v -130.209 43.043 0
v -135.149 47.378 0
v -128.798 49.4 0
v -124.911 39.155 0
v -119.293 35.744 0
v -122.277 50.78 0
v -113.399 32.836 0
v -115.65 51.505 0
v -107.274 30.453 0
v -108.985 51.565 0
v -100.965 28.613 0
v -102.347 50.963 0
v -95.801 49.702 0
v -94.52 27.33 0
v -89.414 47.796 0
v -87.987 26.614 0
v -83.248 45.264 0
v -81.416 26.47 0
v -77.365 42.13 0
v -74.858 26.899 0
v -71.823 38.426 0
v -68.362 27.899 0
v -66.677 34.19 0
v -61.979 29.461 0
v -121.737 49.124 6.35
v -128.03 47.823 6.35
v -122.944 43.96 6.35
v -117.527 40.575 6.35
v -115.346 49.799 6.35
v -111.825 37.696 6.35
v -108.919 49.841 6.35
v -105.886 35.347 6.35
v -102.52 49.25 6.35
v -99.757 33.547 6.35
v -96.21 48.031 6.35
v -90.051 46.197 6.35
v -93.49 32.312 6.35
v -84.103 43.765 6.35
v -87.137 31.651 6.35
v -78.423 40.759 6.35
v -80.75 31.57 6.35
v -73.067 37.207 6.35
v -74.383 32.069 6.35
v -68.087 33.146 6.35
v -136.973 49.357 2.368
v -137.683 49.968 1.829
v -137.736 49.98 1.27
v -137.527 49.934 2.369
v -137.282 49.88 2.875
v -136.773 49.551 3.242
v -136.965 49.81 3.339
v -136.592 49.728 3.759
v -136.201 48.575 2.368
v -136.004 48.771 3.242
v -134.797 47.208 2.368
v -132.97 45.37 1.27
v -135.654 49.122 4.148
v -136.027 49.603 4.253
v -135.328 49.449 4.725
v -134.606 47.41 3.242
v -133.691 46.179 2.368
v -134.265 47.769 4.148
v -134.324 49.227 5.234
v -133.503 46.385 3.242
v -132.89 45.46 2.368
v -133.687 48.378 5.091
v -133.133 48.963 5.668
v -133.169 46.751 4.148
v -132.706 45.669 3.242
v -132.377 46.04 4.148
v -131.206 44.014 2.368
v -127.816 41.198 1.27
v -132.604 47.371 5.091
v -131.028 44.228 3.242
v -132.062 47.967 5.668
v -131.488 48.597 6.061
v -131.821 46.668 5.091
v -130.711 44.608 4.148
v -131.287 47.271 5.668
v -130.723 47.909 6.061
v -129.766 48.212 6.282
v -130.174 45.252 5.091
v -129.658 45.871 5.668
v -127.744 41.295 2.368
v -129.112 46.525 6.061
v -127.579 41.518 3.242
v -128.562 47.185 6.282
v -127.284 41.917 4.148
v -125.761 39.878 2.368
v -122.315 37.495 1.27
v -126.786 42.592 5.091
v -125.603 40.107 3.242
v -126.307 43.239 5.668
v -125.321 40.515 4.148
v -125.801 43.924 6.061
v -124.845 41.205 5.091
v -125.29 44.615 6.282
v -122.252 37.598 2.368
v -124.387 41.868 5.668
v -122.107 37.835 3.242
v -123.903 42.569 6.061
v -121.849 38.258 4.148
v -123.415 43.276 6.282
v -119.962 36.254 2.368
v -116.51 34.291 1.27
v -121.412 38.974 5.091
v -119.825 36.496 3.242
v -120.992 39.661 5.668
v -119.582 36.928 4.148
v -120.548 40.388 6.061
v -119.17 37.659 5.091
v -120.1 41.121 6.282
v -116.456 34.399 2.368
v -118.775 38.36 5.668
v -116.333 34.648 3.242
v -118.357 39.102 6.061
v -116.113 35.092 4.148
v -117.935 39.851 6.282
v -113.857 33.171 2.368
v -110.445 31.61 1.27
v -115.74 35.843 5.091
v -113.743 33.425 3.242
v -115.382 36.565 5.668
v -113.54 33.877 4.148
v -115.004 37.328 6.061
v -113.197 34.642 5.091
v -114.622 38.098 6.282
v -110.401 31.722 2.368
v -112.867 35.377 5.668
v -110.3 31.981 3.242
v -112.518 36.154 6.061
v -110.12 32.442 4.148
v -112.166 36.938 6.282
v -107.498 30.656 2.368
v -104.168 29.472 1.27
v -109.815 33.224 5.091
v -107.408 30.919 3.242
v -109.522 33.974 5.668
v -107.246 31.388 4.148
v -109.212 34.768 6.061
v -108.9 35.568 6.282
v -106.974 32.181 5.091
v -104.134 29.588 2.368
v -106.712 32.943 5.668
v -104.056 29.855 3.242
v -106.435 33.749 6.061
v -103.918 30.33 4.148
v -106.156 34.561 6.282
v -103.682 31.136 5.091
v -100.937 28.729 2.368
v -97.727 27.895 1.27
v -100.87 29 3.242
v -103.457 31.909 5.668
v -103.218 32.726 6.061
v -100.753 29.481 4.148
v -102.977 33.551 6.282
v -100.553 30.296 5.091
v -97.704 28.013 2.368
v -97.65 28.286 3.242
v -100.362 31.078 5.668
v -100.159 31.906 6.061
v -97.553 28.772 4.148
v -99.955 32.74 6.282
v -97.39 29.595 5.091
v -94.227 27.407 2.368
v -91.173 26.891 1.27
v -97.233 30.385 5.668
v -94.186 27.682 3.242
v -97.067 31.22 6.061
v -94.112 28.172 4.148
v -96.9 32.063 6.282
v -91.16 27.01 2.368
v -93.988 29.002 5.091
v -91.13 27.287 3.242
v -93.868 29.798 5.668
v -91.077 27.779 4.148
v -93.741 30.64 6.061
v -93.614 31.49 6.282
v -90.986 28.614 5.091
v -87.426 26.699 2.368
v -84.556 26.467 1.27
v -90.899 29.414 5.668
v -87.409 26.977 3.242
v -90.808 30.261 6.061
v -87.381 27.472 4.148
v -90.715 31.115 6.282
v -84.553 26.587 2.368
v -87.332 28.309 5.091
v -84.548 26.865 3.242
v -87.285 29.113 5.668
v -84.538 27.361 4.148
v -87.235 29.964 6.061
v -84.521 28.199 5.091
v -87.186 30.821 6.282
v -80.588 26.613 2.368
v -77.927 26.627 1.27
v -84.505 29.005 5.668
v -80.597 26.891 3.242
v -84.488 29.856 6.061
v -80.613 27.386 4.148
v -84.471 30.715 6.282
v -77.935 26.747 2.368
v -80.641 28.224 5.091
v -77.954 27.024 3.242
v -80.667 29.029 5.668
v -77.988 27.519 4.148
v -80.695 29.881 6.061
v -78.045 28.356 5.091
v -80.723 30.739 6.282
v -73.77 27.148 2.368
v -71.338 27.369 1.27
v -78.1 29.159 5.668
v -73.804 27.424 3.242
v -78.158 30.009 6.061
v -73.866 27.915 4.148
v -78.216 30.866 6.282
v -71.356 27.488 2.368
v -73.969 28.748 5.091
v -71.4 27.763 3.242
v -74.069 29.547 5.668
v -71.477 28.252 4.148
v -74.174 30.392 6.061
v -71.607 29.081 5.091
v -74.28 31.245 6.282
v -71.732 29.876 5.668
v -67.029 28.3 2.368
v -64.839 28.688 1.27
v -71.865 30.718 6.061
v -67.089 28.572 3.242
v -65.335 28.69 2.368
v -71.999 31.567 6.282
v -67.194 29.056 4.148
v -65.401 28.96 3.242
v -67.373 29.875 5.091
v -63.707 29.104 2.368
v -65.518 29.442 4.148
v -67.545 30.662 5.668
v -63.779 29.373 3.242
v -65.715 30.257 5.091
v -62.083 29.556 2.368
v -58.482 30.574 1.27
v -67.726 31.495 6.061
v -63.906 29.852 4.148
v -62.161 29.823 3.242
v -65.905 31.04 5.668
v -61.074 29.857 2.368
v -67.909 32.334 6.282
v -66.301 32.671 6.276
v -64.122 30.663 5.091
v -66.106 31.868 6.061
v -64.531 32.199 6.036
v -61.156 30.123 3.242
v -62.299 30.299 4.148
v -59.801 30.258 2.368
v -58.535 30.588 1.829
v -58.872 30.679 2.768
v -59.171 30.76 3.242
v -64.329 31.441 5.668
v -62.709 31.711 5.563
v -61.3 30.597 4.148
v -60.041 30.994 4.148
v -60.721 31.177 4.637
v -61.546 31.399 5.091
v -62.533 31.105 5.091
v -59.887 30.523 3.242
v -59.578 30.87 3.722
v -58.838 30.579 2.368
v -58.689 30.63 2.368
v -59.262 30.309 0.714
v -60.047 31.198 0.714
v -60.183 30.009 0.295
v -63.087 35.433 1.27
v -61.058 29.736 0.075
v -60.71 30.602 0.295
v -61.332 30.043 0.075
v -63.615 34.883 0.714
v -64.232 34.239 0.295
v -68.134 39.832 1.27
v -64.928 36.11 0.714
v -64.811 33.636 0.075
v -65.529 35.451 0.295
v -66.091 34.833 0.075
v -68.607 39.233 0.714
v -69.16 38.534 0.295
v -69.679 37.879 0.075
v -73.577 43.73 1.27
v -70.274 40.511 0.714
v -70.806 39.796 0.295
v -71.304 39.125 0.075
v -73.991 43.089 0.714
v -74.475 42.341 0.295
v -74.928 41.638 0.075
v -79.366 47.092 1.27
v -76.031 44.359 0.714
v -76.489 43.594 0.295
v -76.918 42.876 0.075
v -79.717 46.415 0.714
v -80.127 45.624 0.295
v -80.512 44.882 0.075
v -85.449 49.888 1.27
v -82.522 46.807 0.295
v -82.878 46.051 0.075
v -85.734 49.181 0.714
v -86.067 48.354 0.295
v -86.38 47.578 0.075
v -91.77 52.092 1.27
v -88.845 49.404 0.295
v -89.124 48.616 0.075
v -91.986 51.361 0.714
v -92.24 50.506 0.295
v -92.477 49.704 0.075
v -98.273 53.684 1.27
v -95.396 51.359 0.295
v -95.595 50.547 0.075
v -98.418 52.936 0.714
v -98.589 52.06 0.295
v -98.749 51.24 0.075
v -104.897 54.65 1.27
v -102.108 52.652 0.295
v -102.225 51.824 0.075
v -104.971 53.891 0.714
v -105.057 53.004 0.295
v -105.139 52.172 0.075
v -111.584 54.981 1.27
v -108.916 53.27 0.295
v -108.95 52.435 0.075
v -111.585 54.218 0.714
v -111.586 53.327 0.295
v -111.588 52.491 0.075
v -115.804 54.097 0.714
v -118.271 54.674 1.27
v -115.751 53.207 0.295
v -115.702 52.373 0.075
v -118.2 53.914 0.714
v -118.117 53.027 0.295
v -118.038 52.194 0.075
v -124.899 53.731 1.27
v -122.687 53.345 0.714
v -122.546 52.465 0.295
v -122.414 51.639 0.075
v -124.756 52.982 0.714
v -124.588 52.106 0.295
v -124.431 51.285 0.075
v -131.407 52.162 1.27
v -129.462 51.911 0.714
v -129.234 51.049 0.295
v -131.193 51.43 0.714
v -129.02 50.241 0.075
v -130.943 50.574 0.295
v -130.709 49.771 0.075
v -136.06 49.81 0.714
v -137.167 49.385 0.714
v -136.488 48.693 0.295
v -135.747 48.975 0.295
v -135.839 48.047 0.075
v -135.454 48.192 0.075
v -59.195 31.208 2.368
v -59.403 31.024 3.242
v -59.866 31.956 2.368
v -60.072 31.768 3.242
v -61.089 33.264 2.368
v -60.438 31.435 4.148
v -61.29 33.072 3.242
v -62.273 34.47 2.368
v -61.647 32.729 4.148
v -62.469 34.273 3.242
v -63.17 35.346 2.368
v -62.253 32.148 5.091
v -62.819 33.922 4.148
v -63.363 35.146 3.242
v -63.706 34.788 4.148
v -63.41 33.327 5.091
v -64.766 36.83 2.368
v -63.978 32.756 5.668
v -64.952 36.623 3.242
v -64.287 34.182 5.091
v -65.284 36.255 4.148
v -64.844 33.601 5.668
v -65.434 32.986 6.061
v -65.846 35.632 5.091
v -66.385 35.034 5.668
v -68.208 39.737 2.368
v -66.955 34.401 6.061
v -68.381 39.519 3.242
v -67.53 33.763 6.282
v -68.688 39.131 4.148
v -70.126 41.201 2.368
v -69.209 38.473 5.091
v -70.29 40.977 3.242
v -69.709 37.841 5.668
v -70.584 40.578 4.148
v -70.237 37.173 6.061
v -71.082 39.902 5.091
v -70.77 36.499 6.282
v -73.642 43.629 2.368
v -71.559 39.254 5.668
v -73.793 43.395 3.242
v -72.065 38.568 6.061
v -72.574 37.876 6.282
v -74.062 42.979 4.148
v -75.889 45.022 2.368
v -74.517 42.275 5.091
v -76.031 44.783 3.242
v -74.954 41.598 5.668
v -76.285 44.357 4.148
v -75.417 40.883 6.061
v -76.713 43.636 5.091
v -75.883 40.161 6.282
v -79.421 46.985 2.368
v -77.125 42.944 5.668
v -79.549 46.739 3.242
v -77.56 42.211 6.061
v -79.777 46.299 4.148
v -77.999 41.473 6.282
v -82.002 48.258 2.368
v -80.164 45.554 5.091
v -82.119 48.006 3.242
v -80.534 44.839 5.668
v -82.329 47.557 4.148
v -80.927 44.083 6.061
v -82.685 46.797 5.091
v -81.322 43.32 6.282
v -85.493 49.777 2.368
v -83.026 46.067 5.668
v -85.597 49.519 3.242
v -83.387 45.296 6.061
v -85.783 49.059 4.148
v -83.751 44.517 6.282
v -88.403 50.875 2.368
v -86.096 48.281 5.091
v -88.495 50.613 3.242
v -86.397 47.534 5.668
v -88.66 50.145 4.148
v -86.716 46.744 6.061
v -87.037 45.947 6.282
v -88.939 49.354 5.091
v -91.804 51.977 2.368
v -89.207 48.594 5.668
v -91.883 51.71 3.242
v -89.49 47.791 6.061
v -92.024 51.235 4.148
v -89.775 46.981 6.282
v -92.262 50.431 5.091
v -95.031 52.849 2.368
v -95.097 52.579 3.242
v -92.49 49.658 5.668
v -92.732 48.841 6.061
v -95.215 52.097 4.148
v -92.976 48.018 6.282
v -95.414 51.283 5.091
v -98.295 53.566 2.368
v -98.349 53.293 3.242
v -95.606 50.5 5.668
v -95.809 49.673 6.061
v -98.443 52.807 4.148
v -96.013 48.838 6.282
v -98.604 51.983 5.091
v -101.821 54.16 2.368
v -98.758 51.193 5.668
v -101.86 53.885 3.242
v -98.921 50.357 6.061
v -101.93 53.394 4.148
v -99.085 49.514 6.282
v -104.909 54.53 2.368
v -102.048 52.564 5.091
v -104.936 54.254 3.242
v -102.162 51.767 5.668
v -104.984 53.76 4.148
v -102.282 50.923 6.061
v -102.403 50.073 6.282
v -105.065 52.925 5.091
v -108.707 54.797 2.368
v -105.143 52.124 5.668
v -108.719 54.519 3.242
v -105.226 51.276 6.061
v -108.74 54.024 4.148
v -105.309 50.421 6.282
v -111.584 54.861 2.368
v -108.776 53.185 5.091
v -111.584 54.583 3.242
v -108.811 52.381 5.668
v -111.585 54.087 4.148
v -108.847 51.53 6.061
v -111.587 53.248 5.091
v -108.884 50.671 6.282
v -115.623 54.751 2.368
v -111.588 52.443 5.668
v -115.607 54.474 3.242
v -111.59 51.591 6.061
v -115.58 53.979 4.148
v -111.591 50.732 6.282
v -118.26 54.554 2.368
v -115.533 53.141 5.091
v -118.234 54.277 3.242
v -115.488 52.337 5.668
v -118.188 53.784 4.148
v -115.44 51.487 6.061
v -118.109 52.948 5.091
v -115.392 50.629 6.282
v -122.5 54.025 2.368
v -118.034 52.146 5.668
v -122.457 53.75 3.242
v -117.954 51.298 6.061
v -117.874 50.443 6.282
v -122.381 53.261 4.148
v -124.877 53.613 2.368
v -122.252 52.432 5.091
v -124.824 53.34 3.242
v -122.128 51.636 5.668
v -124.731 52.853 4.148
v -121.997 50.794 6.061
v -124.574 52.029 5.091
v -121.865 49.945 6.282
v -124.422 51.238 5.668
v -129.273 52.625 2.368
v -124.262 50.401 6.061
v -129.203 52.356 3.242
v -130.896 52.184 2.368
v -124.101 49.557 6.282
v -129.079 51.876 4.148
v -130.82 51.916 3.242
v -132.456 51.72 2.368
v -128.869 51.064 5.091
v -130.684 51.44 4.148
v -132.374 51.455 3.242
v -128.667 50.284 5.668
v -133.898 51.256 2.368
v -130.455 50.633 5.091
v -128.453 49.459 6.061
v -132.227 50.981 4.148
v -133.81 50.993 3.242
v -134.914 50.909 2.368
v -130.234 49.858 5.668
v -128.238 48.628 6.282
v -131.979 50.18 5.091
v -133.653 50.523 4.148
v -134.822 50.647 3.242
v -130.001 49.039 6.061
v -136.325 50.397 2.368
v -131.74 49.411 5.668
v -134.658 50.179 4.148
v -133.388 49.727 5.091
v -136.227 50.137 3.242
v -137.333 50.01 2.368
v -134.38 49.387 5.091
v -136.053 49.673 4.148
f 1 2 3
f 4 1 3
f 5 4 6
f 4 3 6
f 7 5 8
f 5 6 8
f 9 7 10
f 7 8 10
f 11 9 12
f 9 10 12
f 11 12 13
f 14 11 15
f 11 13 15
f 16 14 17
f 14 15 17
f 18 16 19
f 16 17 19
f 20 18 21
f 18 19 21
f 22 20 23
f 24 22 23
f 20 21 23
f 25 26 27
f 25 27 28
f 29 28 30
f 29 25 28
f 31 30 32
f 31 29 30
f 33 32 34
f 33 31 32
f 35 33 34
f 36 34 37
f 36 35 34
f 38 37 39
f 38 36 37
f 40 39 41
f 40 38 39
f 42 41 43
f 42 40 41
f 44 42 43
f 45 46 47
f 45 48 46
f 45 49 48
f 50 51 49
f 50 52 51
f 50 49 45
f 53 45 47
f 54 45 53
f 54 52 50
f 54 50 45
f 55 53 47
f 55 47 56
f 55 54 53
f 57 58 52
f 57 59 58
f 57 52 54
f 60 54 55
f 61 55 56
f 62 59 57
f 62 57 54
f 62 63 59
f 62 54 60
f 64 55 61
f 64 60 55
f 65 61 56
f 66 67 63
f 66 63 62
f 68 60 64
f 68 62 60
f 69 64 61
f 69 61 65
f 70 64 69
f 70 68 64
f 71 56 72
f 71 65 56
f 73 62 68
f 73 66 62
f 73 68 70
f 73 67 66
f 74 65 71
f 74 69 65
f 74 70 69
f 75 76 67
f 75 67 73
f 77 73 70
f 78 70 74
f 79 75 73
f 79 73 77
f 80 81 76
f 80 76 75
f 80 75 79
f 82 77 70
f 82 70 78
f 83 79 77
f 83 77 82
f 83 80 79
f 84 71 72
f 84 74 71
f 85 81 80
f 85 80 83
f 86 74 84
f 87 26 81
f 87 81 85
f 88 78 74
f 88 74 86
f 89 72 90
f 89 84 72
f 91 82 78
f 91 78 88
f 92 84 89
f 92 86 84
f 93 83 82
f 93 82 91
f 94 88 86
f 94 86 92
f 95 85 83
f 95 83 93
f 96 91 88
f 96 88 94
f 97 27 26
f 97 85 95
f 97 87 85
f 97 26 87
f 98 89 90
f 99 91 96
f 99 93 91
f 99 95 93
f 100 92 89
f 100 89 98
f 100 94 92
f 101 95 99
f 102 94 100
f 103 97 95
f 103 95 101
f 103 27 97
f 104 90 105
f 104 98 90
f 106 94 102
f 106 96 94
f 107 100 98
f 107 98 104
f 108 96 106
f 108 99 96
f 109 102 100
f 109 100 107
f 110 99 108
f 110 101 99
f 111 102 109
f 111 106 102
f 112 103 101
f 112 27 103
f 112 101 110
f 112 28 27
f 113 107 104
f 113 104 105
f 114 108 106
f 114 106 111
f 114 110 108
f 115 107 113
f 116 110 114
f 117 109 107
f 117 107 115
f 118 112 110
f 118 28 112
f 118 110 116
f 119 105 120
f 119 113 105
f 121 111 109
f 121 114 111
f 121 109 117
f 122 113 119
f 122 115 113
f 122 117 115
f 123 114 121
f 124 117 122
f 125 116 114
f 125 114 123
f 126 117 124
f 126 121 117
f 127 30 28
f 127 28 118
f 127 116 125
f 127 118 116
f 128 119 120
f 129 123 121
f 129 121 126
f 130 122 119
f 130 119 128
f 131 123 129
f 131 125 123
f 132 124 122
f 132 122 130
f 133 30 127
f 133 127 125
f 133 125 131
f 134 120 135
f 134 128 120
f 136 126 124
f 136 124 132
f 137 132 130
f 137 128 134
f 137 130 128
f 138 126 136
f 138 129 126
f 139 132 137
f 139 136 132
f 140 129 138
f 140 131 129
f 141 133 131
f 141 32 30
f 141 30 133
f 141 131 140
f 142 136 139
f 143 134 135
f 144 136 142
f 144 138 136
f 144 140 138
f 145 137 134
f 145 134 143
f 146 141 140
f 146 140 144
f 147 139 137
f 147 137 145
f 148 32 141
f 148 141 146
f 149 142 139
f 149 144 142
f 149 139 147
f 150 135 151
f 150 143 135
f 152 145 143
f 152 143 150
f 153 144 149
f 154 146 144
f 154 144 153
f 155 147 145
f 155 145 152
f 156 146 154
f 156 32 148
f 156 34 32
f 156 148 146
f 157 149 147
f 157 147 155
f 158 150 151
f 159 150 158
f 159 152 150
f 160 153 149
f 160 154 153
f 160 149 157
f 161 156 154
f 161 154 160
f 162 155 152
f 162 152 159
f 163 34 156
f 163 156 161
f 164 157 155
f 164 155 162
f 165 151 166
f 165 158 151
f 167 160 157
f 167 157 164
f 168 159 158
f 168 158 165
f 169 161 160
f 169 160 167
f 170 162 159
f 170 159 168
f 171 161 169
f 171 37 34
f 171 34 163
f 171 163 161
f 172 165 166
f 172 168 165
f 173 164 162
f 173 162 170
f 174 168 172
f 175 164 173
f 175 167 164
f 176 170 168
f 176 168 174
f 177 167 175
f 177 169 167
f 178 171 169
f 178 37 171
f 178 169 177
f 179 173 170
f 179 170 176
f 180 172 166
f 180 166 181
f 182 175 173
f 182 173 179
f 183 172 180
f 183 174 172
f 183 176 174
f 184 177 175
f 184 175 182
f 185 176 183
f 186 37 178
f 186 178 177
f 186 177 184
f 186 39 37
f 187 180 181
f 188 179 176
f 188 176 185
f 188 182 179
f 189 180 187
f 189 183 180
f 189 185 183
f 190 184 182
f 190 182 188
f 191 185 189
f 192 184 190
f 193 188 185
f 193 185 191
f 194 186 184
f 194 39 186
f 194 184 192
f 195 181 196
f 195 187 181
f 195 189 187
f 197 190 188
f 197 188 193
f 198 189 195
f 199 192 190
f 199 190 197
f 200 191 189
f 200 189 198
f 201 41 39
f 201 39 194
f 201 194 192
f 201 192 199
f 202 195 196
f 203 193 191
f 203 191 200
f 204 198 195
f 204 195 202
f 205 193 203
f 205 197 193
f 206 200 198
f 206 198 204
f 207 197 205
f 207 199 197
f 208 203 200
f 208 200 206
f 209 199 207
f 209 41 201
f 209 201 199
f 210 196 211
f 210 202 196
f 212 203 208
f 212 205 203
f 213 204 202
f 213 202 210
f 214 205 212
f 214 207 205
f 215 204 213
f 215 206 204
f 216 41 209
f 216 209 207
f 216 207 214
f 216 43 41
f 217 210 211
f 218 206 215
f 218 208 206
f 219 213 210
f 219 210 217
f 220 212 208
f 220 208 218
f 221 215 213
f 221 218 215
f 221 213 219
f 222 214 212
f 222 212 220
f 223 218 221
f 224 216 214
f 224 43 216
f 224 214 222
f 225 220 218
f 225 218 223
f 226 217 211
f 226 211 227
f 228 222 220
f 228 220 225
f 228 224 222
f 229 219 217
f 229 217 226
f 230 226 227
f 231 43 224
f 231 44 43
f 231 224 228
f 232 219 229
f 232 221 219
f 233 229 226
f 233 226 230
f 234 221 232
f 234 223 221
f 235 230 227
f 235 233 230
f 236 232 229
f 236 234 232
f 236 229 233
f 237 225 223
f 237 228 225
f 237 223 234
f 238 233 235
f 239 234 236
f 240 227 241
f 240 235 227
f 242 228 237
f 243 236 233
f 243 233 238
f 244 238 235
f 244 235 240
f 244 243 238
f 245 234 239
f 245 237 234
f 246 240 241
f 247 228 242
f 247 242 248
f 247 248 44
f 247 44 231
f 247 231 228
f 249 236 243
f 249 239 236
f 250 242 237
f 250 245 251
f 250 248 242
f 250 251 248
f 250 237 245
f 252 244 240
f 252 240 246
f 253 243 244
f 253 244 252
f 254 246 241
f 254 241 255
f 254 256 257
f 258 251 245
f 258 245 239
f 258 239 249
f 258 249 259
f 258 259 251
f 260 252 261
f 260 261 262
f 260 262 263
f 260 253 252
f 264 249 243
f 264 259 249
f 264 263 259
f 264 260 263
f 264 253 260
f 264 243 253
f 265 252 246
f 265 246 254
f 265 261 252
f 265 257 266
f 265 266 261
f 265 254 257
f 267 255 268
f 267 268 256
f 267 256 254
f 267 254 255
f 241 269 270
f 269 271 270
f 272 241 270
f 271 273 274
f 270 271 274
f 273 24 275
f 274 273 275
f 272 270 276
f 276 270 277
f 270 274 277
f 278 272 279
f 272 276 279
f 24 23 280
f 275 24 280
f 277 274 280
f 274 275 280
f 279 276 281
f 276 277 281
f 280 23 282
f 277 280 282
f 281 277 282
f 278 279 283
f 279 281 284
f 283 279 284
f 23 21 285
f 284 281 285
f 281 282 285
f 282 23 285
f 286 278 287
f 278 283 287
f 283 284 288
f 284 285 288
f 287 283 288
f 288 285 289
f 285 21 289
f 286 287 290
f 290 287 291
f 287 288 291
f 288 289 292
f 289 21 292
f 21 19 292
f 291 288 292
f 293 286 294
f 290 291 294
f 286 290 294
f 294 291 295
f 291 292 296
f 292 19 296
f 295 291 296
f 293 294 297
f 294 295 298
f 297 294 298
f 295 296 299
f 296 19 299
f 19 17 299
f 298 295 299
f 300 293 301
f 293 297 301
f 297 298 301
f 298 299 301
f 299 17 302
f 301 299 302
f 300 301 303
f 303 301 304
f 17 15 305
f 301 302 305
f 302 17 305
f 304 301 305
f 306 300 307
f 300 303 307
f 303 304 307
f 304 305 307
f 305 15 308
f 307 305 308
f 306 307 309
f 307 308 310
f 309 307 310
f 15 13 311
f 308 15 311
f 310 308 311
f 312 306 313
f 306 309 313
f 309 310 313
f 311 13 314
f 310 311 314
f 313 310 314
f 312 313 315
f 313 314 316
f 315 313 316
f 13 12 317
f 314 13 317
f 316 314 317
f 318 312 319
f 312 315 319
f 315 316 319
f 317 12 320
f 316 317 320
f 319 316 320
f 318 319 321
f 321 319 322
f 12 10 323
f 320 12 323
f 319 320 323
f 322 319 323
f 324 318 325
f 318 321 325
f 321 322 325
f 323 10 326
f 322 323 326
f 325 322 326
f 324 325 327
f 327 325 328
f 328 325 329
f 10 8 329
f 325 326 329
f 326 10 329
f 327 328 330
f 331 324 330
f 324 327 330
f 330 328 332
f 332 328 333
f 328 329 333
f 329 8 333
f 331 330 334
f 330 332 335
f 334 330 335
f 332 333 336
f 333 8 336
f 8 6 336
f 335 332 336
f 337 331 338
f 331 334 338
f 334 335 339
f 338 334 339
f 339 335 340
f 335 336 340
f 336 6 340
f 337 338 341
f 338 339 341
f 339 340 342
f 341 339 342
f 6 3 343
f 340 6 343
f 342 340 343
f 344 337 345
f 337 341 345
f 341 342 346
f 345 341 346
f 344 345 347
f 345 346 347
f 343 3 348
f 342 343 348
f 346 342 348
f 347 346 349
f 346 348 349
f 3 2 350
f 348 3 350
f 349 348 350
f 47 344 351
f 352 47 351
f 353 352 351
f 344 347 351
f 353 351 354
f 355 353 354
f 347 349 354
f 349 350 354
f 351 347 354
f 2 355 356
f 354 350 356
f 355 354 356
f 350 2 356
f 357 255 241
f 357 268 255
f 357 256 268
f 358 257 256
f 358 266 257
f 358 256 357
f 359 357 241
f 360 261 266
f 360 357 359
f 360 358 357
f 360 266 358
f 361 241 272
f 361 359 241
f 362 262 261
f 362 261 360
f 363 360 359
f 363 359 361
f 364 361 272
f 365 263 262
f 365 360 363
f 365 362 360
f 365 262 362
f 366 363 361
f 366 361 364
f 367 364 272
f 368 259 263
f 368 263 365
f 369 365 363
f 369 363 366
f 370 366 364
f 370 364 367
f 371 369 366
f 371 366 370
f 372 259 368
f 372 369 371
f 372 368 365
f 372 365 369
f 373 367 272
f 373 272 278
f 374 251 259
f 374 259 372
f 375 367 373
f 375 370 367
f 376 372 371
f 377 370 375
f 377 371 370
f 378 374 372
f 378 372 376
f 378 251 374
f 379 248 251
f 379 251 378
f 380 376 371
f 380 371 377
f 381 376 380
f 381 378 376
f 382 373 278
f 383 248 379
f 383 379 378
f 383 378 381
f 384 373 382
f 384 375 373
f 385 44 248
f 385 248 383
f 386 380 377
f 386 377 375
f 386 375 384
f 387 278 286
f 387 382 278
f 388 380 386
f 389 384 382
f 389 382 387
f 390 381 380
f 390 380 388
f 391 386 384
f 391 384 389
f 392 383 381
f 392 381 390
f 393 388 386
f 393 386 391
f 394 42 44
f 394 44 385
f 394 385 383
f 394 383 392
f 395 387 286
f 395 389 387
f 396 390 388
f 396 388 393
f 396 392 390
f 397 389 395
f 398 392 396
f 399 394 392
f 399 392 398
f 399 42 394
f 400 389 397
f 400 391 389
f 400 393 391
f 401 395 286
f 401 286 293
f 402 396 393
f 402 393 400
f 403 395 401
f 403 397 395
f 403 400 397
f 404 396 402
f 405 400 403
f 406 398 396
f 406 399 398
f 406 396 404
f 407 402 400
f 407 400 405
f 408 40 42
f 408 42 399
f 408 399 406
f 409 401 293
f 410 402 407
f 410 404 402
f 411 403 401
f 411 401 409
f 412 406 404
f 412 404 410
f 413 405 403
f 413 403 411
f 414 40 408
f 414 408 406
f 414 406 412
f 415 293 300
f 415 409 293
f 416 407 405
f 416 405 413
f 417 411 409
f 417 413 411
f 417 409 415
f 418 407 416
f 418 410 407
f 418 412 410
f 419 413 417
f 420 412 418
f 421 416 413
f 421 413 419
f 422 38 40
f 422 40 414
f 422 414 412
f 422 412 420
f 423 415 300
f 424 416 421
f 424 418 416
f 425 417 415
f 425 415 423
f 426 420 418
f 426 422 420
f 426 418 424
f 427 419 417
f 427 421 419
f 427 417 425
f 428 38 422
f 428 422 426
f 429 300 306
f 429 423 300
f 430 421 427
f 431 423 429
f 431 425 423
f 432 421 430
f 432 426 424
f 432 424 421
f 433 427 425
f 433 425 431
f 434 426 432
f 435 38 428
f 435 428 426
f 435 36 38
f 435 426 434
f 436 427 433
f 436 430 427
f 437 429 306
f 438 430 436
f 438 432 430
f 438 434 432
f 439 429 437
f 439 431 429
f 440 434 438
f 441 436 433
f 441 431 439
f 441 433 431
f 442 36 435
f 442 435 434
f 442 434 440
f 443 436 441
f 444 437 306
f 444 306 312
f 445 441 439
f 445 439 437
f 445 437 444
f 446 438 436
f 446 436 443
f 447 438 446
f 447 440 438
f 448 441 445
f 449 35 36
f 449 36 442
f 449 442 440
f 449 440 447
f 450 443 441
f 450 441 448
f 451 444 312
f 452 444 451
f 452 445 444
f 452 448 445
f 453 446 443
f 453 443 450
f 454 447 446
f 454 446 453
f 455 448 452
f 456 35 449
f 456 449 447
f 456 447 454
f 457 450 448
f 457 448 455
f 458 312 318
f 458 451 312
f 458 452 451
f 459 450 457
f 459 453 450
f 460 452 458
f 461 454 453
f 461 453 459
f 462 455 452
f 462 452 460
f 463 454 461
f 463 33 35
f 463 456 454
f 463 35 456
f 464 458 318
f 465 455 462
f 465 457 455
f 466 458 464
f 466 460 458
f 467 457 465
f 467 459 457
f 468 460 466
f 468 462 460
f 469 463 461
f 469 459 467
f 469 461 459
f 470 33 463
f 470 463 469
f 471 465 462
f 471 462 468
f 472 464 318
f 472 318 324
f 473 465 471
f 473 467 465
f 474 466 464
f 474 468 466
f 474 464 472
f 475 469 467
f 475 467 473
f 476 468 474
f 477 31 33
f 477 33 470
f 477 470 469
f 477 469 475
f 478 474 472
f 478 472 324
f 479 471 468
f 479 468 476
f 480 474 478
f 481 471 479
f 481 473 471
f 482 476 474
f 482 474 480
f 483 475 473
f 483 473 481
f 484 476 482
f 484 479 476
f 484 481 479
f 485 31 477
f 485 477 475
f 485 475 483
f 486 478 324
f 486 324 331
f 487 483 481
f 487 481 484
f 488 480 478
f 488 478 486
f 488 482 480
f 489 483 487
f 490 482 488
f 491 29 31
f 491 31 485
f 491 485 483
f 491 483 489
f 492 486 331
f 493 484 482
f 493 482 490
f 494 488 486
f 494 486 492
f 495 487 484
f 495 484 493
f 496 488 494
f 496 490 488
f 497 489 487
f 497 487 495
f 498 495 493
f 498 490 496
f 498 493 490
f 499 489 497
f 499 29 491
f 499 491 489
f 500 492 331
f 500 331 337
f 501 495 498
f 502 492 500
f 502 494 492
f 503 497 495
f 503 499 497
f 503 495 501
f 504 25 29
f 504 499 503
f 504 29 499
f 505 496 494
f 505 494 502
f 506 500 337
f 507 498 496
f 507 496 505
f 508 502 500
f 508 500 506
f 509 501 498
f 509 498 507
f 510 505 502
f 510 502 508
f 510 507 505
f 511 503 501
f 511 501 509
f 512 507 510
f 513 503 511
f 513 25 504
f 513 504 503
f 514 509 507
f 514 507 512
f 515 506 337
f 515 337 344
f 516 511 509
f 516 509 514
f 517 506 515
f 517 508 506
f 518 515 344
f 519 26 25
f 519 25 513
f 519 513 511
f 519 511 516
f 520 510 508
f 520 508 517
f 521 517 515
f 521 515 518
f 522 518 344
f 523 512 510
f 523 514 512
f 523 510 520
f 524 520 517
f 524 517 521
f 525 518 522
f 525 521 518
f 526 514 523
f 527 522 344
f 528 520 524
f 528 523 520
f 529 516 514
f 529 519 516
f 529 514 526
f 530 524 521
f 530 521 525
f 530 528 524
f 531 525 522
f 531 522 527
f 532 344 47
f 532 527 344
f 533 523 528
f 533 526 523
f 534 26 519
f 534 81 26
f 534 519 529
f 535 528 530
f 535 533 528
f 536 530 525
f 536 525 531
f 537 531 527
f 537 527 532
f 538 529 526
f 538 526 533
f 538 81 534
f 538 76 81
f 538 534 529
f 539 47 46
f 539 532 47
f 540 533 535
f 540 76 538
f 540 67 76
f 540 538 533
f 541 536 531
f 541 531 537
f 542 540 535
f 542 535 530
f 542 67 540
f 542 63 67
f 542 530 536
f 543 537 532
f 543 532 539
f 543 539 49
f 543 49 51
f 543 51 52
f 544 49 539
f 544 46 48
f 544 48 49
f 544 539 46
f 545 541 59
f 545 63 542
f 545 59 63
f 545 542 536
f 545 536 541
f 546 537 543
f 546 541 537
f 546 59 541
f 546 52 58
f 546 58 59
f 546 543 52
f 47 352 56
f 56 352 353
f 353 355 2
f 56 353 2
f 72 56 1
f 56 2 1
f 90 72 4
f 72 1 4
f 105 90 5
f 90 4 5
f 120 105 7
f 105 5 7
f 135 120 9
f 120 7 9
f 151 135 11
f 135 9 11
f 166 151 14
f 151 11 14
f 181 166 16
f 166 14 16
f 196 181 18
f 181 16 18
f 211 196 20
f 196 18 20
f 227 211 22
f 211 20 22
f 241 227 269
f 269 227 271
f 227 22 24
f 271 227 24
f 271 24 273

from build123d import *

# Parameters (mm, degrees)
F1_DEPTH    = 6.35
F2_R        = 5.08
F3_T2_ANGLE = 84.7300035824


# Not quite as in the source:
# - a fillet or chamfer that OpenCascade refuses, or shapes differently, is made with other operations: its cross-section is extruded or revolved along the edge and cut away or added


with BuildPart() as f1:
    # F0 (on Top) → F1 (new body)
    with BuildSketch(Plane.XY):
        with BuildLine():
            ThreePointArc((-58.4820285439, 30.5738802999), (-95.0022427224, 52.9656761429), (-137.7363353968, 49.9797277153))
            ThreePointArc((-137.7363353968, 49.9797277153), (-100.9651889281, 28.6127500264), (-58.4820285439, 30.5738802999))
        make_face()
    extrude(amount=F1_DEPTH)

    # F2
    f2_edges = [f1.edges().sort_by_distance(p)[0] for p in [
        (-100.965189, 28.61275, 6.35),
        (-95.002243, 52.965676, 6.35),
    ]]
    fillet(f2_edges, radius=F2_R)

    # F3: fillet of radius 5.08 on 2 edges, made by hand

    # F3_s1 → F3_t2 (revolve, cut)
    with BuildSketch(Plane(origin=(-27.6470070166, 41.1795425882, 0), x_dir=(0, 0, 1), z_dir=(0.557404804, -0.8302408593, 0))):
        with BuildLine():
            ThreePointArc((1.27, 31.0101609977), (0.3280951188, 32.5742139386), (0, 34.3702651628))
            Line((0, 34.3702651628), (0, 31.0101609977))
            Line((0, 31.0101609977), (1.27, 31.0101609977))
        make_face()
    revolve(axis=Axis((-111.7067534455, -15.2562566767, 0), (0, 0, 1)), revolution_arc=F3_T2_ANGLE, mode=Mode.SUBTRACT)


solid = f1.part
